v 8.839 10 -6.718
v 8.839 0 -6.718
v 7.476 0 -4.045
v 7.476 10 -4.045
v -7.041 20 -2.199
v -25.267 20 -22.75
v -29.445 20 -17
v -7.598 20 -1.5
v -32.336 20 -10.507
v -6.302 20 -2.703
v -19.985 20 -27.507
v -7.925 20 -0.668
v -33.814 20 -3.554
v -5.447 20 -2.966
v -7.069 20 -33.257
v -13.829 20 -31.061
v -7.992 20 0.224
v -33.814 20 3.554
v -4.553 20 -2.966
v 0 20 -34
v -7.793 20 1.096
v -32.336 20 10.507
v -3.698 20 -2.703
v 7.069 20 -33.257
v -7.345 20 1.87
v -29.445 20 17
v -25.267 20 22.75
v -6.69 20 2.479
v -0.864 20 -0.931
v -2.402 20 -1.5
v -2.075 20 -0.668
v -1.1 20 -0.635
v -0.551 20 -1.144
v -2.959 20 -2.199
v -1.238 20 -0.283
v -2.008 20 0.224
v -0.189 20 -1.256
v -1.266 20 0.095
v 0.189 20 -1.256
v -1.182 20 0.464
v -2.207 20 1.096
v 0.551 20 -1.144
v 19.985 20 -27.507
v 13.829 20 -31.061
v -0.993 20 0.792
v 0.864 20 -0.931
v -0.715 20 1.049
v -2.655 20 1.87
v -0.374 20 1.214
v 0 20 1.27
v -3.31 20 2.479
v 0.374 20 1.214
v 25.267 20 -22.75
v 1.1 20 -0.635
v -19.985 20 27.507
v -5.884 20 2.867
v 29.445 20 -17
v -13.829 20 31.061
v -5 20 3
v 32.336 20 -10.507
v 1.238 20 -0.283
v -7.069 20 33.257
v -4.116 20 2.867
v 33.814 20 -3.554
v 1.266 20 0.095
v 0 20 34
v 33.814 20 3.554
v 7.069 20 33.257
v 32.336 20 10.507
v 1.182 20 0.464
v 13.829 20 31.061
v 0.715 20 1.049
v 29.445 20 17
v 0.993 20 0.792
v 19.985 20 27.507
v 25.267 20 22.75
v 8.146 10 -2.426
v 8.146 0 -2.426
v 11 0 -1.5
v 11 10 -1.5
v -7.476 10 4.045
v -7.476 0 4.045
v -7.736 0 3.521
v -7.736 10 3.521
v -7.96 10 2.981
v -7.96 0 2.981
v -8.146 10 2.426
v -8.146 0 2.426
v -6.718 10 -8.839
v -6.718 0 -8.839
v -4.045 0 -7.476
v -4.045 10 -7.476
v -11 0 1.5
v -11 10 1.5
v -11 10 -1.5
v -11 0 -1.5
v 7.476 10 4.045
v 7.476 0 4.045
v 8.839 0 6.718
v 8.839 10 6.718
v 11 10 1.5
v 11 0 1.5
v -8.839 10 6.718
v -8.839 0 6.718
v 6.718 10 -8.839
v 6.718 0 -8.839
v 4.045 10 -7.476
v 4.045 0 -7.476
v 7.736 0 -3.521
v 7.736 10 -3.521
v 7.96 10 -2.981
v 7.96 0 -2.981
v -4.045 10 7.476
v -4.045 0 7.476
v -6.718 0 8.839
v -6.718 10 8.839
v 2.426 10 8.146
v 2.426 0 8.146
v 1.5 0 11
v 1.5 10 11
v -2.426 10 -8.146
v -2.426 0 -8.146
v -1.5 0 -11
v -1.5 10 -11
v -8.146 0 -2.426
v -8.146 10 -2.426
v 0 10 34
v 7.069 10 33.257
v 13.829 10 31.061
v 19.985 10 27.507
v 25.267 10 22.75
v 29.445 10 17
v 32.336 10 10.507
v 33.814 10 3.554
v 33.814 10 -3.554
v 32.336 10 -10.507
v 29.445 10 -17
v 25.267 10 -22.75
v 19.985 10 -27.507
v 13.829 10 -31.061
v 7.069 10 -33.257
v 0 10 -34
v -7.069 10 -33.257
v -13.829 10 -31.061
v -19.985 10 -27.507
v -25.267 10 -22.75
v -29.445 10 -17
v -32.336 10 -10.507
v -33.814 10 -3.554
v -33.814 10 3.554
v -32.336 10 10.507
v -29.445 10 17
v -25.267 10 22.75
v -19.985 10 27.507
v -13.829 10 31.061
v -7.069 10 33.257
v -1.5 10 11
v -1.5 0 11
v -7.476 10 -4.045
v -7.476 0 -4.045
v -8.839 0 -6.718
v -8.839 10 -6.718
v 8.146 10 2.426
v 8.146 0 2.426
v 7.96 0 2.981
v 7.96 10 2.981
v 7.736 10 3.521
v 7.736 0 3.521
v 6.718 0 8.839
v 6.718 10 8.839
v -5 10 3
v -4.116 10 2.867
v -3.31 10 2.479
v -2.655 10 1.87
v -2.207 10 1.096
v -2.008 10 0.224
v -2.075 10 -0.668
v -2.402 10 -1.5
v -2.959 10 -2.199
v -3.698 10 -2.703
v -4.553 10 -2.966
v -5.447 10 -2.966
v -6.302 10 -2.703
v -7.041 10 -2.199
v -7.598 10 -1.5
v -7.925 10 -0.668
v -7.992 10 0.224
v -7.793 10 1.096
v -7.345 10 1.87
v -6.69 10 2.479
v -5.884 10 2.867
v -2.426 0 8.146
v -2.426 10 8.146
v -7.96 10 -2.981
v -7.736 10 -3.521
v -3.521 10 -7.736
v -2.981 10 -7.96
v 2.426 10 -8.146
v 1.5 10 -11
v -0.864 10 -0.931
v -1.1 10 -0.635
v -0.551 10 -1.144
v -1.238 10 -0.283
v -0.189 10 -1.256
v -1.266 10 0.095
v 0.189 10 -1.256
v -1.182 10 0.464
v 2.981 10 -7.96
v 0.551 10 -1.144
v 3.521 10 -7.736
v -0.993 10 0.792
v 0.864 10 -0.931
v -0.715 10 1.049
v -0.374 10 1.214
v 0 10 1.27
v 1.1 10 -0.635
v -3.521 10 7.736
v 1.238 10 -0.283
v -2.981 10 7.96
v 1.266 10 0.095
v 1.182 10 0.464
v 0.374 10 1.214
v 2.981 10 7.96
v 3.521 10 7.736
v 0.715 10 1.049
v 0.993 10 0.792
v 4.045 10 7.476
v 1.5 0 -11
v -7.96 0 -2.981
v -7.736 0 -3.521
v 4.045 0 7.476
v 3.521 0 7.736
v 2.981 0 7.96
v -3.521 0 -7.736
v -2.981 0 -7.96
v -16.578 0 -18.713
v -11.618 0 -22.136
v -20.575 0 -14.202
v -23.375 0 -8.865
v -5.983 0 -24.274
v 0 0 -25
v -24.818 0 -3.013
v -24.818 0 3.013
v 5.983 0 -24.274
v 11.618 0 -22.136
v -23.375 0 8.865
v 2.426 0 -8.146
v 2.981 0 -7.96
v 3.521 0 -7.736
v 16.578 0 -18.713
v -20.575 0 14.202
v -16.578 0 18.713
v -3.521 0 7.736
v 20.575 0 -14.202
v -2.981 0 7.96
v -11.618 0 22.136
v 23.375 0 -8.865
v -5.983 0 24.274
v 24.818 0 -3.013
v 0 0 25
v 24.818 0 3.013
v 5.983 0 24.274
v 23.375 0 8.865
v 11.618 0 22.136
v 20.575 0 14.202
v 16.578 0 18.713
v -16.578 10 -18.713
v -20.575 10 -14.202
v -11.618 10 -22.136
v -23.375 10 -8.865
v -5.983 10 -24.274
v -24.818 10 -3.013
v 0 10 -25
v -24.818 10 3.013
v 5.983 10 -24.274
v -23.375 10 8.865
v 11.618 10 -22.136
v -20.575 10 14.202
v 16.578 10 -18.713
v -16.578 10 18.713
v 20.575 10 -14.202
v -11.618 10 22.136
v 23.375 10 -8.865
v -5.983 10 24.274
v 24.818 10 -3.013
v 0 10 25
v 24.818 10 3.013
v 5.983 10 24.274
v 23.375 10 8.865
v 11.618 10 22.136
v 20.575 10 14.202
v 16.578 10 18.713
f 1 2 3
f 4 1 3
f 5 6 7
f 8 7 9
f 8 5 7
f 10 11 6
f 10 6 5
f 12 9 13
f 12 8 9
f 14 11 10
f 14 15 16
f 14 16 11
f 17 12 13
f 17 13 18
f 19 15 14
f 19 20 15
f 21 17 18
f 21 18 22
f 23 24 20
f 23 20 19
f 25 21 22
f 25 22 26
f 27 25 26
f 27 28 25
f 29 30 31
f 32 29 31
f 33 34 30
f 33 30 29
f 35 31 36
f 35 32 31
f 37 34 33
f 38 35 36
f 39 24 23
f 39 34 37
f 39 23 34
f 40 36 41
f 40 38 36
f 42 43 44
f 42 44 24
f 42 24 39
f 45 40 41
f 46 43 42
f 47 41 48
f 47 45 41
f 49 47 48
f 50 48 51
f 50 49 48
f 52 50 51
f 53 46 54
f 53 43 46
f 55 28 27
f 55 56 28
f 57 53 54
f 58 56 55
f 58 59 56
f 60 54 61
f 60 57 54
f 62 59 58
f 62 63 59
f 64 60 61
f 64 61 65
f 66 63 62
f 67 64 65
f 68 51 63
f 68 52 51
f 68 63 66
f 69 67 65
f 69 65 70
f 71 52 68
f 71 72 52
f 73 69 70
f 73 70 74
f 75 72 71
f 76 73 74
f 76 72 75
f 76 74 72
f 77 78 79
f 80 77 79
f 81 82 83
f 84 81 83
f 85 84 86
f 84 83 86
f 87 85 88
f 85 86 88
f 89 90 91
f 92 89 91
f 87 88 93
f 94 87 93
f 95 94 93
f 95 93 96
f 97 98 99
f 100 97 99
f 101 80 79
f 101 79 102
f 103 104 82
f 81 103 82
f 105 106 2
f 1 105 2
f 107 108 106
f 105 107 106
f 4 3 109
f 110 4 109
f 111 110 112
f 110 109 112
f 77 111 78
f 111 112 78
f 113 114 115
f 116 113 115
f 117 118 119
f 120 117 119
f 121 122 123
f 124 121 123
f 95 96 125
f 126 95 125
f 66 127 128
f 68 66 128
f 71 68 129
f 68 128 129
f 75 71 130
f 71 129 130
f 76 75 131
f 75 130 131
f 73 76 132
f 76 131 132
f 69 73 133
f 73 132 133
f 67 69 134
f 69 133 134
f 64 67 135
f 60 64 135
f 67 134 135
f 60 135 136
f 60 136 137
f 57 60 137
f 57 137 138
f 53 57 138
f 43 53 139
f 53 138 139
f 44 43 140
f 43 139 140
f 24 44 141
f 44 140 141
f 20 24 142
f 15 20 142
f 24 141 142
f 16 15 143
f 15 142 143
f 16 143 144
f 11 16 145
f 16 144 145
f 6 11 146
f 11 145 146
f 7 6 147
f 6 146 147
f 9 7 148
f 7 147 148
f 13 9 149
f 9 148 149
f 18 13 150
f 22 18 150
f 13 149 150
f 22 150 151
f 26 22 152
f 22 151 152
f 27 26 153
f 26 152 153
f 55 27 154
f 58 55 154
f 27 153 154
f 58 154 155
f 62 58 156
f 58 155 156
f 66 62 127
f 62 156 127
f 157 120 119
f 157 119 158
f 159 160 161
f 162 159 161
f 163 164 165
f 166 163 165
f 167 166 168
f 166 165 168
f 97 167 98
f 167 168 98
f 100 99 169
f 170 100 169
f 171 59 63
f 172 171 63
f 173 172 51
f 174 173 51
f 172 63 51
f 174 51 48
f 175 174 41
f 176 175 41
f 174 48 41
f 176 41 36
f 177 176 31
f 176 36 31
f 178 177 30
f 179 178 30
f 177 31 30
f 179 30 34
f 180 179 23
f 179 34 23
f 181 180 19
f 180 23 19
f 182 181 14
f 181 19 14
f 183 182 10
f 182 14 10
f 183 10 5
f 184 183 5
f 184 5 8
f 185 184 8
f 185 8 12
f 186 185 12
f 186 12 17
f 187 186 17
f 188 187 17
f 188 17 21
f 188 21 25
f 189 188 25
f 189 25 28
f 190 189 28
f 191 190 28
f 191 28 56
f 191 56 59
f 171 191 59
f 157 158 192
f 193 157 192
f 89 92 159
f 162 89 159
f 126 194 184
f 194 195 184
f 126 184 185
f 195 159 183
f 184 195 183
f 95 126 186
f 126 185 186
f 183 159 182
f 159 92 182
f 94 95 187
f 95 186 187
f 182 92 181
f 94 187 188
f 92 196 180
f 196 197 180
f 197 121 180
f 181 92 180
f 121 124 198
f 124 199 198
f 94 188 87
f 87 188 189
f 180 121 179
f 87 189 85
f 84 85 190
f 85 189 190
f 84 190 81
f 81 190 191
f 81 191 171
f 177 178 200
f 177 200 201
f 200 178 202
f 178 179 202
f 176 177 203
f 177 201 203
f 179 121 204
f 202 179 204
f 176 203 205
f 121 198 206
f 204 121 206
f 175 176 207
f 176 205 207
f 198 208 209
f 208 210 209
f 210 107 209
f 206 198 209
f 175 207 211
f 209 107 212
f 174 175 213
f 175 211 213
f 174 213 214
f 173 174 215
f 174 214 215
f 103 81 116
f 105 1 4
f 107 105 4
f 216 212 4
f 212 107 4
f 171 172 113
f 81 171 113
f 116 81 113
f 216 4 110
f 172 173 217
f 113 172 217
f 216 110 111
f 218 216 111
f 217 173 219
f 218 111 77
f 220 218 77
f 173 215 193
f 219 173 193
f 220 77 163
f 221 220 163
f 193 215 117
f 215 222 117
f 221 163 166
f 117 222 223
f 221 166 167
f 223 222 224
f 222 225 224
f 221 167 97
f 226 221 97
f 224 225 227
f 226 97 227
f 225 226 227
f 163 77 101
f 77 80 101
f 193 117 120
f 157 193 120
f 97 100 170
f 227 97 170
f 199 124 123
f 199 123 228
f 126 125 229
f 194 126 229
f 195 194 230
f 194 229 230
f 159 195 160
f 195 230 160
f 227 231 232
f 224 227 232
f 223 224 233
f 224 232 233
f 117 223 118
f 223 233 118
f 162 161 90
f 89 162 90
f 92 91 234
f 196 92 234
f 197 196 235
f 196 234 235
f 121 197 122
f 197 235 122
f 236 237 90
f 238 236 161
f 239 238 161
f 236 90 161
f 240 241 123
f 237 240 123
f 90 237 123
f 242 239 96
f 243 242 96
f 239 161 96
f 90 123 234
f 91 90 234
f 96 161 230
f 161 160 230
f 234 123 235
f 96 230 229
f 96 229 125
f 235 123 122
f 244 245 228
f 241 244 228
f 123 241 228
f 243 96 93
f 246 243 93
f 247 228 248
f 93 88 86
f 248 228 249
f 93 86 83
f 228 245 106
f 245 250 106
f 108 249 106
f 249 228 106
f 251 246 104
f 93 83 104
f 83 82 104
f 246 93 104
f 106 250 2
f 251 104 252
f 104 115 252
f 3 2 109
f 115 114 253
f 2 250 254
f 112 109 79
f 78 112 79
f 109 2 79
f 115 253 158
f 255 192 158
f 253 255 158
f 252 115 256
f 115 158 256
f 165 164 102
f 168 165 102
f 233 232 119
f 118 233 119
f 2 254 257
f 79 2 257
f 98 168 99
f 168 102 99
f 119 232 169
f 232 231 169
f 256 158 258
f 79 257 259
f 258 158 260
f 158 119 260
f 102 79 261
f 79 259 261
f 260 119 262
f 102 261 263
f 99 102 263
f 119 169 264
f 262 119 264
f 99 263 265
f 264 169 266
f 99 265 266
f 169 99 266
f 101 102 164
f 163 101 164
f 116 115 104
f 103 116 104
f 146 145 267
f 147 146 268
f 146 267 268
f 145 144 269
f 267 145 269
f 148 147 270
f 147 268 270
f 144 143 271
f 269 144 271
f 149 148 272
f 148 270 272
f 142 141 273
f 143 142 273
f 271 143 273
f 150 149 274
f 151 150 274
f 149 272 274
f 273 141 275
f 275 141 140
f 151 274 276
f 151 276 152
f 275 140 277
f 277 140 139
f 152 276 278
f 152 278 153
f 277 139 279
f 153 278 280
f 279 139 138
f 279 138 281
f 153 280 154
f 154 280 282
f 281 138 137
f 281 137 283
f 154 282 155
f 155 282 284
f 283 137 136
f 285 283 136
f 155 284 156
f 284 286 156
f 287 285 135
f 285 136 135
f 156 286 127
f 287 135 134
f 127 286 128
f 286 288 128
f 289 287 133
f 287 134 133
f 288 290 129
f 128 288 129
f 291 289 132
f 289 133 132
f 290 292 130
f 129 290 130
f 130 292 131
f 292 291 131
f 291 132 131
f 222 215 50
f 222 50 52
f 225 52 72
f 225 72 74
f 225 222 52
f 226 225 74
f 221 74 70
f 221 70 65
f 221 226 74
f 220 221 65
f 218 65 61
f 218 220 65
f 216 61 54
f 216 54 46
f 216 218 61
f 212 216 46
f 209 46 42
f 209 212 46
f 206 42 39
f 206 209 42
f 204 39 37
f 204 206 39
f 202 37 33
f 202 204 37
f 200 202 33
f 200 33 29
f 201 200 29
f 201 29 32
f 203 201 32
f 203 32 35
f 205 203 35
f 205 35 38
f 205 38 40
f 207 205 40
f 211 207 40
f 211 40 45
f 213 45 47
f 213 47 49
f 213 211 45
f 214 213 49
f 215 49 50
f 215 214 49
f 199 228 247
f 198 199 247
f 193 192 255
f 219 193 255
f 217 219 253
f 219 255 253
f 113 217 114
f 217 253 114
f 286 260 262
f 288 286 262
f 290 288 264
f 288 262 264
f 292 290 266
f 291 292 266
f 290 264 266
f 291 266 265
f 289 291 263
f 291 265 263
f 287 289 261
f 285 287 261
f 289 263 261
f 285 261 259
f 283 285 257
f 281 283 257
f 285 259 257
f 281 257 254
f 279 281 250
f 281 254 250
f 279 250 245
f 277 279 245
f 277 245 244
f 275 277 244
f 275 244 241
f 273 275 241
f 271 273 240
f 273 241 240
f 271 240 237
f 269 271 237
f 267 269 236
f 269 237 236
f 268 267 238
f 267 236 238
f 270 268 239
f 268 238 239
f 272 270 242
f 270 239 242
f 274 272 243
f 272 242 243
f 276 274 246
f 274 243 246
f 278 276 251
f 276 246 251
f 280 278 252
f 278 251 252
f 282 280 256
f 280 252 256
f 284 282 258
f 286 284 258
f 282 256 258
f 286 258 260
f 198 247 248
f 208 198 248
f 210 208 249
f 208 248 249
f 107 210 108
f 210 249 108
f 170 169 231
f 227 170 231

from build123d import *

# Parameters (mm, degrees)
SKETCH1_R           = 25
BOSS_EXTRUDE1_DEPTH = 10
SKETCH2_R           = 34
SKETCH2_R_2         = 1.27
BOSS_EXTRUDE2_DEPTH = 10
SKETCH3_R           = 3
CUT_EXTRUDE1_DEPTH  = 53.076866265


with BuildPart() as part:
    # Sketch1 → Boss-Extrude1 (new body)
    with BuildSketch(Plane(origin=(0, 0, 0), x_dir=(1, 0, 0), z_dir=(0, 1, 0))):
        with Locations(Location((0, 0, 0), (0, 0, 270))):
            Circle(SKETCH1_R)
        with BuildLine():
            Line((-1.5, 11), (1.5, 11))
            Line((1.5, 11), (2.425924848, 8.146464793))
            ThreePointArc((2.425924848, 8.146464793), (3.252809175, 7.852976026), (4.045032587, 7.475808409))
            Line((4.045032587, 7.475808409), (6.717514421, 8.838834765))
            Line((6.717514421, 8.838834765), (8.838834765, 6.717514421))
            Line((8.838834765, 6.717514421), (7.475808409, 4.045032587))
            ThreePointArc((7.475808409, 4.045032587), (7.852976026, 3.252809175), (8.146464793, 2.425924848))
            Line((8.146464793, 2.425924848), (11, 1.5))
            Line((11, 1.5), (11, -1.5))
            Line((11, -1.5), (8.146464793, -2.425924848))
            ThreePointArc((8.146464793, -2.425924848), (7.852976026, -3.252809175), (7.475808409, -4.045032587))
            Line((7.475808409, -4.045032587), (8.838834765, -6.717514421))
            Line((8.838834765, -6.717514421), (6.717514421, -8.838834765))
            Line((6.717514421, -8.838834765), (4.045032587, -7.475808409))
            ThreePointArc((4.045032587, -7.475808409), (3.252809175, -7.852976026), (2.425924848, -8.146464793))
            Line((2.425924848, -8.146464793), (1.5, -11))
            Line((1.5, -11), (-1.5, -11))
            Line((-1.5, -11), (-2.425924848, -8.146464793))
            ThreePointArc((-2.425924848, -8.146464793), (-3.252809175, -7.852976026), (-4.045032587, -7.475808409))
            Line((-4.045032587, -7.475808409), (-6.717514421, -8.838834765))
            Line((-6.717514421, -8.838834765), (-8.838834765, -6.717514421))
            Line((-8.838834765, -6.717514421), (-7.475808409, -4.045032587))
            ThreePointArc((-7.475808409, -4.045032587), (-7.852976026, -3.252809175), (-8.146464793, -2.425924848))
            Line((-8.146464793, -2.425924848), (-11, -1.5))
            Line((-11, -1.5), (-11, 1.5))
            Line((-11, 1.5), (-8.146464793, 2.425924848))
            ThreePointArc((-8.146464793, 2.425924848), (-7.852976026, 3.252809175), (-7.475808409, 4.045032587))
            Line((-7.475808409, 4.045032587), (-8.838834765, 6.717514421))
            Line((-8.838834765, 6.717514421), (-6.717514421, 8.838834765))
            Line((-6.717514421, 8.838834765), (-4.045032587, 7.475808409))
            ThreePointArc((-4.045032587, 7.475808409), (-3.252809175, 7.852976026), (-2.425924848, 8.146464793))
            Line((-2.425924848, 8.146464793), (-1.5, 11))
        make_face(mode=Mode.SUBTRACT)
    extrude(amount=BOSS_EXTRUDE1_DEPTH)

    # Sketch2 → Boss-Extrude2 (add)
    with BuildSketch(Plane(origin=(0, 10, 0), x_dir=(1, 0, 0), z_dir=(0, 1, 0))):
        with Locations(Location((0, 0, 0), (0, 0, 270))):
            Circle(SKETCH2_R)
        with Locations(Location((0, 0, 0), (0, 0, 270))):
            Circle(SKETCH2_R_2, mode=Mode.SUBTRACT)
    extrude(amount=BOSS_EXTRUDE2_DEPTH)

    # Sketch3 → Cut-Extrude1 (cut, through all)
    with BuildSketch(Plane(origin=(0, 20, 0), x_dir=(1, 0, 0), z_dir=(0, 1, 0))):
        with Locations(Location((-5, 0, 0), (0, 0, 270))):
            Circle(SKETCH3_R)
    extrude(amount=-CUT_EXTRUDE1_DEPTH, mode=Mode.SUBTRACT)


solid = part.part
